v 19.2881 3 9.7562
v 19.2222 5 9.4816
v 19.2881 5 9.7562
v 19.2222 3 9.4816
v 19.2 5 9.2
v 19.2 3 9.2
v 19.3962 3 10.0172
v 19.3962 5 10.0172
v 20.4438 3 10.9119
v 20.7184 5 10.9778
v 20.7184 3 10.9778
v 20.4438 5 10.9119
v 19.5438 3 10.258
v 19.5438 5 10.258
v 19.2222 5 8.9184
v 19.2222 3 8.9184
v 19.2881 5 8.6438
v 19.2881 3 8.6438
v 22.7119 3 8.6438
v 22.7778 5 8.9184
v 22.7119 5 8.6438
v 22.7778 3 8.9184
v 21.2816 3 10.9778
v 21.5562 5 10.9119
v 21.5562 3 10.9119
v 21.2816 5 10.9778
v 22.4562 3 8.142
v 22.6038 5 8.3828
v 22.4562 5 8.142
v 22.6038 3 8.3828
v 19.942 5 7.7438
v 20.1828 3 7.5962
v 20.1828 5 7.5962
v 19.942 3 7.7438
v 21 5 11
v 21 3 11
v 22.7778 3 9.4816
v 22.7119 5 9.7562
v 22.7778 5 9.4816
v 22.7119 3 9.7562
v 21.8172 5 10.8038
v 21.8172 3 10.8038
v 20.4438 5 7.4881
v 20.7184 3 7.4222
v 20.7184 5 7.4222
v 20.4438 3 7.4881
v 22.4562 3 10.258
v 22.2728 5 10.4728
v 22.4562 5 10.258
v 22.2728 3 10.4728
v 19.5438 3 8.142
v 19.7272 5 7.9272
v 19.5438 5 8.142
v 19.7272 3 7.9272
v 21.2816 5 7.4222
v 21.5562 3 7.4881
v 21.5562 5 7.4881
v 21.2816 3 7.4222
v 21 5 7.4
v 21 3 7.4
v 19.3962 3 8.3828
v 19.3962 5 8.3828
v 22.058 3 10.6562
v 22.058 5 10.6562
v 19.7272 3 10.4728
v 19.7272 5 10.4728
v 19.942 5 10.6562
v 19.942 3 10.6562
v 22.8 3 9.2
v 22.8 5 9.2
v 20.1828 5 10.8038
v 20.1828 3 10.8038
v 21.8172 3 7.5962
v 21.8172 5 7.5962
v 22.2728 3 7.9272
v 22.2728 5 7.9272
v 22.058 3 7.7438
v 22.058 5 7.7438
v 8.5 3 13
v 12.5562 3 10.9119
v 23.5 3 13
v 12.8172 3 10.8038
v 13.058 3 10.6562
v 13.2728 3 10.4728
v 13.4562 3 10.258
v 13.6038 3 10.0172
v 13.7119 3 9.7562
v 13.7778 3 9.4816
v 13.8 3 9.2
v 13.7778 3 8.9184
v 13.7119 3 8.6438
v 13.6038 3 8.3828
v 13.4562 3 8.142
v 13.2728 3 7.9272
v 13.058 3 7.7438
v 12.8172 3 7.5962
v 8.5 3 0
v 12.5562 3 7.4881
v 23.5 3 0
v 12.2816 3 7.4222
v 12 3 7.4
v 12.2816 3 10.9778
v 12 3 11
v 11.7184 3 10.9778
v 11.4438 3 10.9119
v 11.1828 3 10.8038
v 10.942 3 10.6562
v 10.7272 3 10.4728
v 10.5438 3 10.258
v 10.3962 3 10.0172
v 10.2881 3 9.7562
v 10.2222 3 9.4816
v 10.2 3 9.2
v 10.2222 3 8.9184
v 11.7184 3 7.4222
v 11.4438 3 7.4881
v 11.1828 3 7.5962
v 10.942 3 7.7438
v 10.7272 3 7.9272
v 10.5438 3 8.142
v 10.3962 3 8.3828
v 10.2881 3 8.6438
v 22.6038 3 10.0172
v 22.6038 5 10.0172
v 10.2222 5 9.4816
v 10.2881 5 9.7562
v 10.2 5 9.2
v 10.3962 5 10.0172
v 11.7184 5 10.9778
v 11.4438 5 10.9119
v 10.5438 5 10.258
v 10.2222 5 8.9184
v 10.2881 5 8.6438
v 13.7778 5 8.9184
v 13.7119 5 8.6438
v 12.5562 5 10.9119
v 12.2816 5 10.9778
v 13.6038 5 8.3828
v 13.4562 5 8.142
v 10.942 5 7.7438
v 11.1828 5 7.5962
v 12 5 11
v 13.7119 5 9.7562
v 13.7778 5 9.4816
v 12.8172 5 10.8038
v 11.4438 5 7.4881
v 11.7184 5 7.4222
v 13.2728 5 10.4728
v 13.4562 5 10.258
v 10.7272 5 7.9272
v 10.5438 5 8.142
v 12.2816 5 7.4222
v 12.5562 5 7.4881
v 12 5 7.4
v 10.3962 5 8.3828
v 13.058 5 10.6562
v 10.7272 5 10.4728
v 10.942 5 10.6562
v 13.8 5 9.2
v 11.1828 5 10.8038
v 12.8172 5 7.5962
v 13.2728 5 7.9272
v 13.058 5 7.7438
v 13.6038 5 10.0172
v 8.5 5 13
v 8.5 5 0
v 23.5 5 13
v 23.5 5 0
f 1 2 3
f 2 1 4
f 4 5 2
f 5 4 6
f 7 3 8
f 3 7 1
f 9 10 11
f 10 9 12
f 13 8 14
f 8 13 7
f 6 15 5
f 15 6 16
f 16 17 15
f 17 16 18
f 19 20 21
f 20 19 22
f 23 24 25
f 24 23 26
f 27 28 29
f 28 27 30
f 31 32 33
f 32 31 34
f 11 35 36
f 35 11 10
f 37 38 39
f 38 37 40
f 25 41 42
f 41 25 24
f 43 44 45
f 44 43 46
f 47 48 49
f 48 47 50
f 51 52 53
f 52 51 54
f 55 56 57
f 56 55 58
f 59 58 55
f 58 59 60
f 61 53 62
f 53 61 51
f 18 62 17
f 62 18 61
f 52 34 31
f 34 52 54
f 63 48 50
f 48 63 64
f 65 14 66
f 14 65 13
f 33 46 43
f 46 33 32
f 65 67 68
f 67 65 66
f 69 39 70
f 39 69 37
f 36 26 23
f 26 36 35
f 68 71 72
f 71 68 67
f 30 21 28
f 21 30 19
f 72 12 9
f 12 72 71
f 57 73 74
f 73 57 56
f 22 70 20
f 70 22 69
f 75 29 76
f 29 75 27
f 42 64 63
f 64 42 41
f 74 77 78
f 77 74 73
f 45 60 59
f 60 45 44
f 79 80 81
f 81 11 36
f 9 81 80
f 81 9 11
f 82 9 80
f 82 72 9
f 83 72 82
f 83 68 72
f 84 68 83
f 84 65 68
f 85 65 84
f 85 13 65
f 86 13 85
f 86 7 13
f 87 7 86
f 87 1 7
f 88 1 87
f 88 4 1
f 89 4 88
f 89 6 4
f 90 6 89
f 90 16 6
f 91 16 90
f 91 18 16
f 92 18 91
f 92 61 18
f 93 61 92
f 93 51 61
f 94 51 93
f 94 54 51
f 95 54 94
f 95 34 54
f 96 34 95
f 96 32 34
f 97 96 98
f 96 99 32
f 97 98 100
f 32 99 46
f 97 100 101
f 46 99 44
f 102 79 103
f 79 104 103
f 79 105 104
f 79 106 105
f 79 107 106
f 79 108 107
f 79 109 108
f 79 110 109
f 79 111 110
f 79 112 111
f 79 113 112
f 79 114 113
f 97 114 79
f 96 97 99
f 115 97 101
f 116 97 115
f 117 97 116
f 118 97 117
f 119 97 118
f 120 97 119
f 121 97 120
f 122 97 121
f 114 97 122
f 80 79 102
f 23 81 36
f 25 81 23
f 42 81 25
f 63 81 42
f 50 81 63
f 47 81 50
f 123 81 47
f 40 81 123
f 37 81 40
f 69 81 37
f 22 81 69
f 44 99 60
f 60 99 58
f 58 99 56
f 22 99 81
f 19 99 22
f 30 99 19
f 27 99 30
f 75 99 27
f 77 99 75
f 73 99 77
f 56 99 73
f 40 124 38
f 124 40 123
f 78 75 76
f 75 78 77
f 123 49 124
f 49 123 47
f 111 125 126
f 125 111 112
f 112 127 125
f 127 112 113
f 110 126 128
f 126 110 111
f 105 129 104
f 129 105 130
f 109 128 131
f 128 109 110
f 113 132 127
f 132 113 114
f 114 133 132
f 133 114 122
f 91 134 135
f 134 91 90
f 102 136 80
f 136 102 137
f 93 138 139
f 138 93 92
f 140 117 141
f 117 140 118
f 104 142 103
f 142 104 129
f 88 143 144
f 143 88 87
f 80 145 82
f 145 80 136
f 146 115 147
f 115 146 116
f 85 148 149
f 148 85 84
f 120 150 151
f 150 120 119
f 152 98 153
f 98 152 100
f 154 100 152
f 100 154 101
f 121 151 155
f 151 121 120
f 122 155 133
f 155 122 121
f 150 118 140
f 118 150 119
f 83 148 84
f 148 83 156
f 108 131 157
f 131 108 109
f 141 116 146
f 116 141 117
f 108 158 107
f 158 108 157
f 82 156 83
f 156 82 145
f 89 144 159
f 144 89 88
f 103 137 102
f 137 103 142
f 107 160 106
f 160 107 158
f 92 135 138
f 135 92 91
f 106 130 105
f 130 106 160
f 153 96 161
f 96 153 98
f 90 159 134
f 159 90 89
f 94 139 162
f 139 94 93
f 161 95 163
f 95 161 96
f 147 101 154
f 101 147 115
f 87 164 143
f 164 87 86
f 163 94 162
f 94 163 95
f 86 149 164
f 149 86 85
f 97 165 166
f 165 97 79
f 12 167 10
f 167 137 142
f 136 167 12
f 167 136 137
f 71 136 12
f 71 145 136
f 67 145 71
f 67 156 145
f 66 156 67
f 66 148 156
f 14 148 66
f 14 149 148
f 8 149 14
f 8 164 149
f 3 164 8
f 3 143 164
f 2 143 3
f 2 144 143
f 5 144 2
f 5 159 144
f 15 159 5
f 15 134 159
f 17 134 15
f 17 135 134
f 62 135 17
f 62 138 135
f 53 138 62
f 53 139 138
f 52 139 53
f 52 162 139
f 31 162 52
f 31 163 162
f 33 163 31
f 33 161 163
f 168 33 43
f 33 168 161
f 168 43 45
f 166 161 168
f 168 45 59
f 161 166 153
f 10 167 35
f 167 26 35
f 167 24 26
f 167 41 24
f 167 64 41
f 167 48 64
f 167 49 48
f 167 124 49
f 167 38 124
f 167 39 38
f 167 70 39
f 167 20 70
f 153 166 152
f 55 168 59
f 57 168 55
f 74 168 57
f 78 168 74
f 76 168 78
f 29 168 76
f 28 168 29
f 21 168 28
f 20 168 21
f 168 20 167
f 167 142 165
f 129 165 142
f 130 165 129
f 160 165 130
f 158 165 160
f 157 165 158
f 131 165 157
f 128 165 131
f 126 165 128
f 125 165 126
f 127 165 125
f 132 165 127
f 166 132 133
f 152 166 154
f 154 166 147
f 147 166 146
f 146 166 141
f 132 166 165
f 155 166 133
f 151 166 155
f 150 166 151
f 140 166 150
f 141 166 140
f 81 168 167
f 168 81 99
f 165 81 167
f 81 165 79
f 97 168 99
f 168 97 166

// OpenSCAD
// file: ../lib/gopro_like_connector.scad
$fn = 40;

module connector(wall=2, sz_x=19, sz_y=15) {
  translate([7+(19-sz_x)/2, 5.5+(15-sz_y)/2, 7.5]) {
    cube([sz_x, sz_y, wall]);
  }
  translate([26.5, 5.4, 7.4]) {
    rotate([0, 90, 90]) {
      for(y=[0, 6.4]) {
        translate([-10.2, 6.9+y, 7.6]) {
          rotate([90, 0, 0]) {
            difference() {
              union() {
                cylinder(d=14.7, h=2.6, center=true);
                translate([5, 0, 0]) {
                  cube([10, 14.7, 2.6], center=true);
                }
              }
              translate([-1.4, 0.1, 0]) {
                cylinder(d=6, h=3, center=true);
              }
            }
          }
        }
      }
    }
  }
}


difference() {
    connector(sz_y=36, sz_x =9);
    translate([17, 13, 7]) {
        for(y=[-1,1]) {
            translate([0, y*12, 0]) {
                cylinder(d=3.6, h=10, center=true);
            }
        }
    }
}
// file: ../lib/vent.scad
module vent(x_size=30, x_count=9, z_size=30, z_count=9, y_size=2, center=true, negate=false) {
  if(negate) {
    difference() {
      cube([x_size, y_size, z_size], center=center);
      vent(x_size, x_count, z_size, z_count, y_size, center);
    }
  } else {
    x_off = center ? 0 : x_size/2;
    y_off = center ? 0 : y_size/2;
    z_off = center ? 0 : z_size/2;
    translate([x_off, y_off, z_off]) {
      x_step = x_size/(x_count+x_count+1);
      z_step = z_size/(z_count+z_count+1);
      for(xpos=[-x_size/2+x_step*1.5:x_step*2:x_size/2]) {
        translate([xpos, 0, 0]) {
          cube([x_step, y_size, z_size], center=true);
        }
      }
      for(zpos=[-z_size/2+z_step*1.5:z_step*2:z_size/2]) {
        translate([0, 0, zpos]) {
          cube([x_size, y_size, z_step], center=true);
        }
      }
      // test x_size
      translate([0, 0, -z_size/2-1]) {
        %cube([x_size, 1, 1], center=true);
      }
      // test z_size
      translate([x_size/2+1, 0, 0]) {
        %cube([1, 1, z_size], center=true);
      }
    }
  }
}
// main file
show_camside = false;
show_pinside = false;
show_usb_padding=true;

use <../lib/vent.scad>
use <../lib/gopro_like_connector.scad>

$fn = 40;

// zero - left bottom

wall = 2;

corner_stand_sz_x = 2.5;
corner_stand_sz_y = corner_stand_sz_x;

pcb_sz_x = 28;
pcb_sz_y = 40.4;
pcb_sz_z = 1.5;

pcb_cam_hole_d = 8.4;
pcb_cam_hole_off_x = 14;
pcb_cam_hole_off_y = 32;

led_hole_sz_x = 4;
led_hole_sz_y = led_hole_sz_x;
led_hole_off_x = 23.6;
led_hole_off_y = 8;

top_y_stand_sz_z = 5;
bottom_y_stand_sz_z = 3;
top_y_wall_sz_z = top_y_stand_sz_z + pcb_sz_z;
bottom_y_wall_sz_z = bottom_y_stand_sz_z + pcb_sz_z;
bottom_part_sz_y = 18;

hole_d = 3;
hole_d_through = 3.6;
bolt_stand_d = hole_d_through + 1.5 * wall;

sdcard_hole_off_x = 5;
sdcard_hole_sz_x = 16;
sdcard_hole_sz_z = 4 + pcb_sz_z;

pinside_wall_sz_z = 20;
reset_hole_d = 5;
reset_off_x = 21;
reset_off_y = 36;

// micro usb pcb connector at zero
usb_pcb_sz_x = 15;
usb_pcb_sz_y = 18;
usb_pcb_sz_z = 2;
usb_pcb_hole_d = 3;

usb_pcb_hole_off_x = 2.5;
usb_pcb_hole_dist_x = 9;
usb_pcb_hole_off_y = 9.2;

micro_usb_sz_x = 8;
micro_usb_sz_y = 6.2;
micro_usb_sz_z = 3.3;
micro_usb_under_sz_z = 3;

module esp32cam_camside() {
  difference() { 
    union() {
      // wall
      cube([pcb_sz_x+2*wall, wall, bottom_y_wall_sz_z]);
      // bottom part 
      translate([0, 0, bottom_y_wall_sz_z]) {
        cube([pcb_sz_x+2*wall, bottom_part_sz_y+bolt_stand_d+wall, wall+top_y_wall_sz_z-bottom_y_wall_sz_z]);
      }
      // side walls
      for(x=[0, pcb_sz_x+wall]) {
        translate([x, 0, 0]) {
          cube([wall, bottom_part_sz_y+bolt_stand_d+wall, bottom_y_wall_sz_z]);
        }
      }
      translate([0, bottom_part_sz_y+bolt_stand_d, 0]) {
        translate([0, 0, top_y_wall_sz_z]) {
          cube([pcb_sz_x+2*wall, pcb_sz_y-bottom_part_sz_y+bolt_stand_d+2*wall, wall]);
        }
        // side walls
        for(x=[0, pcb_sz_x+wall]) {
          translate([x, 0, 0]) {
            cube([wall, pcb_sz_y-bottom_part_sz_y+bolt_stand_d+2*wall, top_y_wall_sz_z]);
          }
        }
      }
      // top y wall
      translate([0, pcb_sz_y+2*bolt_stand_d+wall, 0]) {
        cube([pcb_sz_x+2*wall, wall, top_y_wall_sz_z]);
      }
      // pcb stands
      for(x=[wall, wall+pcb_sz_x-corner_stand_sz_x]) {
        translate([x, wall+bolt_stand_d, 0]) {
          translate([0, 0, bottom_y_wall_sz_z-bottom_y_stand_sz_z]) {
            cube([corner_stand_sz_x, corner_stand_sz_y, bottom_y_wall_sz_z]);
          }
          translate([0, pcb_sz_y-corner_stand_sz_y, top_y_wall_sz_z-top_y_stand_sz_z]) {
            cube([corner_stand_sz_x, corner_stand_sz_y, top_y_wall_sz_z]);
          }
        }
      }
      // bolt stands
      for(x=[wall+bolt_stand_d/2, wall+pcb_sz_x-bolt_stand_d/2]) {
        for(y=[wall+bolt_stand_d/2, wall+bolt_stand_d+pcb_sz_y+bolt_stand_d/2]) {
          translate([x, wall+bolt_stand_d/2, 0]) {
            cylinder(d=bolt_stand_d, h=bottom_y_wall_sz_z);
            translate([0, pcb_sz_y+bolt_stand_d, 0]) {
              cylinder(d=bolt_stand_d, h=top_y_wall_sz_z);
            }
          }
        }
      }
    }
    // led hole
    translate([led_hole_off_x+wall, led_hole_off_y+wall+bolt_stand_d, top_y_stand_sz_z-1]) {
      hull() {
        cube([led_hole_sz_x, led_hole_sz_y, 1]);
        translate([-2, -2, top_y_stand_sz_z-bottom_y_stand_sz_z+2]) {
          cube([led_hole_sz_x+4, led_hole_sz_y+4, 1]);
        }
      }
    }
    // camera hole
    translate([pcb_cam_hole_off_x+wall, pcb_cam_hole_off_y+wall+bolt_stand_d, 0]) {
      cylinder(d=pcb_cam_hole_d, h=20);
    }
    // bolt stand holes
    for(x=[wall+bolt_stand_d/2, wall+pcb_sz_x-bolt_stand_d/2]) {
      for(y=[wall+bolt_stand_d/2, wall+bolt_stand_d+pcb_sz_y+bolt_stand_d/2]) {
        translate([x, wall+bolt_stand_d/2, 0]) {
          cylinder(d=hole_d_through, h=50);
          translate([0, pcb_sz_y+bolt_stand_d, 0]) {
            cylinder(d=hole_d_through, h=50);
          }
        }
      }
    }
    // sd card hole (useless hole, sd too far from wall)
//    translate([wall+sdcard_hole_off_x, pcb_sz_y+2*bolt_stand_d+wall, 0]) {
//      cube([sdcard_hole_sz_x, wall, sdcard_hole_sz_z]);
//    }
  }
}

pinside_wall_sz_z = 20;

module esp32cam_pinside() {
  difference() { 
    union() {
      // bottom
      cube([pcb_sz_x+2*wall, pcb_sz_y+2*bolt_stand_d+2*wall, wall]);
      translate([0, 0, wall]) {
        // zero y wall
        cube([pcb_sz_x+2*wall, wall, pinside_wall_sz_z]);
        // side wall
        for(x=[0, pcb_sz_x+wall]) {
          translate([x, 0, 0]) {
            cube([wall, pcb_sz_y+2*bolt_stand_d+2*wall, pinside_wall_sz_z]);
          }
        }
        // end y wall
        translate([0, pcb_sz_y+2*bolt_stand_d+wall, 0]) {
          cube([pcb_sz_x+2*wall, wall, pinside_wall_sz_z]);
        }
        // pcb stands
        for(x=[wall, wall+pcb_sz_x-corner_stand_sz_x]) {
          translate([x, wall+bolt_stand_d, 0]) {
            cube([corner_stand_sz_x, corner_stand_sz_y, pinside_wall_sz_z]);
            translate([0, pcb_sz_y-corner_stand_sz_y, 0]) {
              cube([corner_stand_sz_x, corner_stand_sz_y, pinside_wall_sz_z]);
            }
          }
        }
        // bolt stands
        for(x=[wall+bolt_stand_d/2, wall+pcb_sz_x-bolt_stand_d/2]) {
          for(y=[wall+bolt_stand_d/2, wall+bolt_stand_d+pcb_sz_y+bolt_stand_d/2]) {
            translate([x, wall+bolt_stand_d/2, 0]) {
              cylinder(d=bolt_stand_d, h=pinside_wall_sz_z);
              translate([0, pcb_sz_y+bolt_stand_d, 0]) {
                cylinder(d=bolt_stand_d, h=pinside_wall_sz_z);
              }
            }
          }
        }
      }
      translate([0, pcb_sz_y+2*bolt_stand_d+2*wall-9.5, 20.4]) {
        rotate([-90, 0, 0]) {
          connector(wall=wall, sz_x=10, sz_y=0);
        }
      }
    }
    // bolt stand holes
    for(x=[wall+bolt_stand_d/2, wall+pcb_sz_x-bolt_stand_d/2]) {
      for(y=[wall+bolt_stand_d/2, wall+bolt_stand_d+pcb_sz_y+bolt_stand_d/2]) {
        translate([x, wall+bolt_stand_d/2, wall]) {
          cylinder(d=hole_d, h=50);
          translate([0, pcb_sz_y+bolt_stand_d, 0]) {
            cylinder(d=hole_d, h=50);
          }
        }
      }
    }
    // micro usb
    translate([(usb_pcb_sz_x+pcb_sz_x+2*wall)/2, wall+micro_usb_under_sz_z, 0]) {
      rotate([90, 0, 180]) {
        micro_usb_connector();
        for(x=[usb_pcb_hole_off_x, usb_pcb_hole_off_x+usb_pcb_hole_dist_x]) {
          translate([x, usb_pcb_hole_off_y, -10]) {
            cylinder(d=usb_pcb_hole_d+.6, h=20);
          }
        }
      }
    }
    // hole for wires or ventilation
    translate([6, 37, 0]) {
      rotate([90, 0, 0]) {
        vent(x_size=20, x_count=3, z_size=20, z_count=3, center=false, negate=true);
      }
    }
    // reset hole
    translate([wall+reset_off_x, wall+bolt_stand_d+reset_off_y, -25]) {
      cylinder(d=reset_hole_d, h=50);
    }
  }
}

module micro_usb_connector() {
  difference() {
    union() {
      cube([usb_pcb_sz_x, usb_pcb_sz_y, usb_pcb_sz_z]);
      translate([(usb_pcb_sz_x-micro_usb_sz_x)/2, 0, usb_pcb_sz_z]) {
        cube([micro_usb_sz_x, micro_usb_sz_y, micro_usb_sz_z]);
      }
    }
    for(x=[usb_pcb_hole_off_x, usb_pcb_hole_off_x+usb_pcb_hole_dist_x]) {
      translate([x, usb_pcb_hole_off_y, 0]) {
        cylinder(d=usb_pcb_hole_d, h=20);
      }
    }
  }
}

module micro_usb_connector_padding() {
  difference() {
    cube([usb_pcb_sz_x, usb_pcb_sz_y-5, wall]);
    for(x=[usb_pcb_hole_off_x, usb_pcb_hole_off_x+usb_pcb_hole_dist_x]) {
      translate([x, usb_pcb_hole_off_y, 0]) {
        cylinder(d=hole_d_through, h=20);
      }
    }
  }
}

translate([(usb_pcb_sz_x+pcb_sz_x+2*wall)/2, wall+micro_usb_under_sz_z, 0]) {
  rotate([90, 0, 180]) {
    translate([0, 0, -usb_pcb_sz_z]) {
      if(show_usb_padding) {
        micro_usb_connector_padding();
      }
    }
    %micro_usb_connector();
  }
}

color("green") {
  translate([30, 51.5, 30])  {
    rotate([90, 0, -90]) {
      //import("ESP3-CAM_v4.stl");
    }
  }
}


if(show_camside) {
	translate([0, 0, 24]) {
		esp32cam_camside();
	}
}

if(show_pinside) {
	esp32cam_pinside();
}
